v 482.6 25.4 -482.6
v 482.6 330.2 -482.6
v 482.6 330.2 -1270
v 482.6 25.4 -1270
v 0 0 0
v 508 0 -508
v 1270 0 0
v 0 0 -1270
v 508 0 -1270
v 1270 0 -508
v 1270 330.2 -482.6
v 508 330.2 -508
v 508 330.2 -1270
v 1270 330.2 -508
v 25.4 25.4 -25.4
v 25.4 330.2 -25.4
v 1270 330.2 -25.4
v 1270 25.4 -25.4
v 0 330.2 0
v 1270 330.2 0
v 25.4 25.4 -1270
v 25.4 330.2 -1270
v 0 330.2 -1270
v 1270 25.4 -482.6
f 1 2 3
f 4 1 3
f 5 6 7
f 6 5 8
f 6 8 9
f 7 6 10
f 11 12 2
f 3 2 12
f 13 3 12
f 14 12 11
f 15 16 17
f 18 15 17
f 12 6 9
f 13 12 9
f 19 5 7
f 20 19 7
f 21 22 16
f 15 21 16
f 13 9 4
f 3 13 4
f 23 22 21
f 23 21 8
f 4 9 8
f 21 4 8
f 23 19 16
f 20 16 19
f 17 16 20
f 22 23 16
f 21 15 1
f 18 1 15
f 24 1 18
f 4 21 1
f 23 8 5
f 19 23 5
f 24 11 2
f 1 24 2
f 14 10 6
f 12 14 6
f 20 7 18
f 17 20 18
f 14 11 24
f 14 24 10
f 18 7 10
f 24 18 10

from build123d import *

# Parameters (mm, degrees)
BOSS_EXTRUDE1_DEPTH = 330.2
CUT_EXTRUDE2_DEPTH  = 304.8


with BuildPart() as part:
    # Sketch1 → Boss-Extrude1 (new body)
    with BuildSketch(Plane(origin=(0, 0, 0), x_dir=(1, 0, 0), z_dir=(0, 1, 0))):
        Polygon((0, 0), (1270, 0), (1270, 508), (508, 508), (508, 1270), (0, 1270), align=None)
    extrude(amount=BOSS_EXTRUDE1_DEPTH)

    # Sketch2 → Cut-Extrude2 (cut)
    with BuildSketch(Plane(origin=(0, 330.2, 0), x_dir=(1, 0, 0), z_dir=(0, 1, 0))):
        Polygon((25.4, 1270), (25.4, 25.4), (1270, 25.4), (1270, 482.6), (482.6, 482.6), (482.6, 1270), align=None)
    extrude(amount=-CUT_EXTRUDE2_DEPTH, mode=Mode.SUBTRACT)


solid = part.part
